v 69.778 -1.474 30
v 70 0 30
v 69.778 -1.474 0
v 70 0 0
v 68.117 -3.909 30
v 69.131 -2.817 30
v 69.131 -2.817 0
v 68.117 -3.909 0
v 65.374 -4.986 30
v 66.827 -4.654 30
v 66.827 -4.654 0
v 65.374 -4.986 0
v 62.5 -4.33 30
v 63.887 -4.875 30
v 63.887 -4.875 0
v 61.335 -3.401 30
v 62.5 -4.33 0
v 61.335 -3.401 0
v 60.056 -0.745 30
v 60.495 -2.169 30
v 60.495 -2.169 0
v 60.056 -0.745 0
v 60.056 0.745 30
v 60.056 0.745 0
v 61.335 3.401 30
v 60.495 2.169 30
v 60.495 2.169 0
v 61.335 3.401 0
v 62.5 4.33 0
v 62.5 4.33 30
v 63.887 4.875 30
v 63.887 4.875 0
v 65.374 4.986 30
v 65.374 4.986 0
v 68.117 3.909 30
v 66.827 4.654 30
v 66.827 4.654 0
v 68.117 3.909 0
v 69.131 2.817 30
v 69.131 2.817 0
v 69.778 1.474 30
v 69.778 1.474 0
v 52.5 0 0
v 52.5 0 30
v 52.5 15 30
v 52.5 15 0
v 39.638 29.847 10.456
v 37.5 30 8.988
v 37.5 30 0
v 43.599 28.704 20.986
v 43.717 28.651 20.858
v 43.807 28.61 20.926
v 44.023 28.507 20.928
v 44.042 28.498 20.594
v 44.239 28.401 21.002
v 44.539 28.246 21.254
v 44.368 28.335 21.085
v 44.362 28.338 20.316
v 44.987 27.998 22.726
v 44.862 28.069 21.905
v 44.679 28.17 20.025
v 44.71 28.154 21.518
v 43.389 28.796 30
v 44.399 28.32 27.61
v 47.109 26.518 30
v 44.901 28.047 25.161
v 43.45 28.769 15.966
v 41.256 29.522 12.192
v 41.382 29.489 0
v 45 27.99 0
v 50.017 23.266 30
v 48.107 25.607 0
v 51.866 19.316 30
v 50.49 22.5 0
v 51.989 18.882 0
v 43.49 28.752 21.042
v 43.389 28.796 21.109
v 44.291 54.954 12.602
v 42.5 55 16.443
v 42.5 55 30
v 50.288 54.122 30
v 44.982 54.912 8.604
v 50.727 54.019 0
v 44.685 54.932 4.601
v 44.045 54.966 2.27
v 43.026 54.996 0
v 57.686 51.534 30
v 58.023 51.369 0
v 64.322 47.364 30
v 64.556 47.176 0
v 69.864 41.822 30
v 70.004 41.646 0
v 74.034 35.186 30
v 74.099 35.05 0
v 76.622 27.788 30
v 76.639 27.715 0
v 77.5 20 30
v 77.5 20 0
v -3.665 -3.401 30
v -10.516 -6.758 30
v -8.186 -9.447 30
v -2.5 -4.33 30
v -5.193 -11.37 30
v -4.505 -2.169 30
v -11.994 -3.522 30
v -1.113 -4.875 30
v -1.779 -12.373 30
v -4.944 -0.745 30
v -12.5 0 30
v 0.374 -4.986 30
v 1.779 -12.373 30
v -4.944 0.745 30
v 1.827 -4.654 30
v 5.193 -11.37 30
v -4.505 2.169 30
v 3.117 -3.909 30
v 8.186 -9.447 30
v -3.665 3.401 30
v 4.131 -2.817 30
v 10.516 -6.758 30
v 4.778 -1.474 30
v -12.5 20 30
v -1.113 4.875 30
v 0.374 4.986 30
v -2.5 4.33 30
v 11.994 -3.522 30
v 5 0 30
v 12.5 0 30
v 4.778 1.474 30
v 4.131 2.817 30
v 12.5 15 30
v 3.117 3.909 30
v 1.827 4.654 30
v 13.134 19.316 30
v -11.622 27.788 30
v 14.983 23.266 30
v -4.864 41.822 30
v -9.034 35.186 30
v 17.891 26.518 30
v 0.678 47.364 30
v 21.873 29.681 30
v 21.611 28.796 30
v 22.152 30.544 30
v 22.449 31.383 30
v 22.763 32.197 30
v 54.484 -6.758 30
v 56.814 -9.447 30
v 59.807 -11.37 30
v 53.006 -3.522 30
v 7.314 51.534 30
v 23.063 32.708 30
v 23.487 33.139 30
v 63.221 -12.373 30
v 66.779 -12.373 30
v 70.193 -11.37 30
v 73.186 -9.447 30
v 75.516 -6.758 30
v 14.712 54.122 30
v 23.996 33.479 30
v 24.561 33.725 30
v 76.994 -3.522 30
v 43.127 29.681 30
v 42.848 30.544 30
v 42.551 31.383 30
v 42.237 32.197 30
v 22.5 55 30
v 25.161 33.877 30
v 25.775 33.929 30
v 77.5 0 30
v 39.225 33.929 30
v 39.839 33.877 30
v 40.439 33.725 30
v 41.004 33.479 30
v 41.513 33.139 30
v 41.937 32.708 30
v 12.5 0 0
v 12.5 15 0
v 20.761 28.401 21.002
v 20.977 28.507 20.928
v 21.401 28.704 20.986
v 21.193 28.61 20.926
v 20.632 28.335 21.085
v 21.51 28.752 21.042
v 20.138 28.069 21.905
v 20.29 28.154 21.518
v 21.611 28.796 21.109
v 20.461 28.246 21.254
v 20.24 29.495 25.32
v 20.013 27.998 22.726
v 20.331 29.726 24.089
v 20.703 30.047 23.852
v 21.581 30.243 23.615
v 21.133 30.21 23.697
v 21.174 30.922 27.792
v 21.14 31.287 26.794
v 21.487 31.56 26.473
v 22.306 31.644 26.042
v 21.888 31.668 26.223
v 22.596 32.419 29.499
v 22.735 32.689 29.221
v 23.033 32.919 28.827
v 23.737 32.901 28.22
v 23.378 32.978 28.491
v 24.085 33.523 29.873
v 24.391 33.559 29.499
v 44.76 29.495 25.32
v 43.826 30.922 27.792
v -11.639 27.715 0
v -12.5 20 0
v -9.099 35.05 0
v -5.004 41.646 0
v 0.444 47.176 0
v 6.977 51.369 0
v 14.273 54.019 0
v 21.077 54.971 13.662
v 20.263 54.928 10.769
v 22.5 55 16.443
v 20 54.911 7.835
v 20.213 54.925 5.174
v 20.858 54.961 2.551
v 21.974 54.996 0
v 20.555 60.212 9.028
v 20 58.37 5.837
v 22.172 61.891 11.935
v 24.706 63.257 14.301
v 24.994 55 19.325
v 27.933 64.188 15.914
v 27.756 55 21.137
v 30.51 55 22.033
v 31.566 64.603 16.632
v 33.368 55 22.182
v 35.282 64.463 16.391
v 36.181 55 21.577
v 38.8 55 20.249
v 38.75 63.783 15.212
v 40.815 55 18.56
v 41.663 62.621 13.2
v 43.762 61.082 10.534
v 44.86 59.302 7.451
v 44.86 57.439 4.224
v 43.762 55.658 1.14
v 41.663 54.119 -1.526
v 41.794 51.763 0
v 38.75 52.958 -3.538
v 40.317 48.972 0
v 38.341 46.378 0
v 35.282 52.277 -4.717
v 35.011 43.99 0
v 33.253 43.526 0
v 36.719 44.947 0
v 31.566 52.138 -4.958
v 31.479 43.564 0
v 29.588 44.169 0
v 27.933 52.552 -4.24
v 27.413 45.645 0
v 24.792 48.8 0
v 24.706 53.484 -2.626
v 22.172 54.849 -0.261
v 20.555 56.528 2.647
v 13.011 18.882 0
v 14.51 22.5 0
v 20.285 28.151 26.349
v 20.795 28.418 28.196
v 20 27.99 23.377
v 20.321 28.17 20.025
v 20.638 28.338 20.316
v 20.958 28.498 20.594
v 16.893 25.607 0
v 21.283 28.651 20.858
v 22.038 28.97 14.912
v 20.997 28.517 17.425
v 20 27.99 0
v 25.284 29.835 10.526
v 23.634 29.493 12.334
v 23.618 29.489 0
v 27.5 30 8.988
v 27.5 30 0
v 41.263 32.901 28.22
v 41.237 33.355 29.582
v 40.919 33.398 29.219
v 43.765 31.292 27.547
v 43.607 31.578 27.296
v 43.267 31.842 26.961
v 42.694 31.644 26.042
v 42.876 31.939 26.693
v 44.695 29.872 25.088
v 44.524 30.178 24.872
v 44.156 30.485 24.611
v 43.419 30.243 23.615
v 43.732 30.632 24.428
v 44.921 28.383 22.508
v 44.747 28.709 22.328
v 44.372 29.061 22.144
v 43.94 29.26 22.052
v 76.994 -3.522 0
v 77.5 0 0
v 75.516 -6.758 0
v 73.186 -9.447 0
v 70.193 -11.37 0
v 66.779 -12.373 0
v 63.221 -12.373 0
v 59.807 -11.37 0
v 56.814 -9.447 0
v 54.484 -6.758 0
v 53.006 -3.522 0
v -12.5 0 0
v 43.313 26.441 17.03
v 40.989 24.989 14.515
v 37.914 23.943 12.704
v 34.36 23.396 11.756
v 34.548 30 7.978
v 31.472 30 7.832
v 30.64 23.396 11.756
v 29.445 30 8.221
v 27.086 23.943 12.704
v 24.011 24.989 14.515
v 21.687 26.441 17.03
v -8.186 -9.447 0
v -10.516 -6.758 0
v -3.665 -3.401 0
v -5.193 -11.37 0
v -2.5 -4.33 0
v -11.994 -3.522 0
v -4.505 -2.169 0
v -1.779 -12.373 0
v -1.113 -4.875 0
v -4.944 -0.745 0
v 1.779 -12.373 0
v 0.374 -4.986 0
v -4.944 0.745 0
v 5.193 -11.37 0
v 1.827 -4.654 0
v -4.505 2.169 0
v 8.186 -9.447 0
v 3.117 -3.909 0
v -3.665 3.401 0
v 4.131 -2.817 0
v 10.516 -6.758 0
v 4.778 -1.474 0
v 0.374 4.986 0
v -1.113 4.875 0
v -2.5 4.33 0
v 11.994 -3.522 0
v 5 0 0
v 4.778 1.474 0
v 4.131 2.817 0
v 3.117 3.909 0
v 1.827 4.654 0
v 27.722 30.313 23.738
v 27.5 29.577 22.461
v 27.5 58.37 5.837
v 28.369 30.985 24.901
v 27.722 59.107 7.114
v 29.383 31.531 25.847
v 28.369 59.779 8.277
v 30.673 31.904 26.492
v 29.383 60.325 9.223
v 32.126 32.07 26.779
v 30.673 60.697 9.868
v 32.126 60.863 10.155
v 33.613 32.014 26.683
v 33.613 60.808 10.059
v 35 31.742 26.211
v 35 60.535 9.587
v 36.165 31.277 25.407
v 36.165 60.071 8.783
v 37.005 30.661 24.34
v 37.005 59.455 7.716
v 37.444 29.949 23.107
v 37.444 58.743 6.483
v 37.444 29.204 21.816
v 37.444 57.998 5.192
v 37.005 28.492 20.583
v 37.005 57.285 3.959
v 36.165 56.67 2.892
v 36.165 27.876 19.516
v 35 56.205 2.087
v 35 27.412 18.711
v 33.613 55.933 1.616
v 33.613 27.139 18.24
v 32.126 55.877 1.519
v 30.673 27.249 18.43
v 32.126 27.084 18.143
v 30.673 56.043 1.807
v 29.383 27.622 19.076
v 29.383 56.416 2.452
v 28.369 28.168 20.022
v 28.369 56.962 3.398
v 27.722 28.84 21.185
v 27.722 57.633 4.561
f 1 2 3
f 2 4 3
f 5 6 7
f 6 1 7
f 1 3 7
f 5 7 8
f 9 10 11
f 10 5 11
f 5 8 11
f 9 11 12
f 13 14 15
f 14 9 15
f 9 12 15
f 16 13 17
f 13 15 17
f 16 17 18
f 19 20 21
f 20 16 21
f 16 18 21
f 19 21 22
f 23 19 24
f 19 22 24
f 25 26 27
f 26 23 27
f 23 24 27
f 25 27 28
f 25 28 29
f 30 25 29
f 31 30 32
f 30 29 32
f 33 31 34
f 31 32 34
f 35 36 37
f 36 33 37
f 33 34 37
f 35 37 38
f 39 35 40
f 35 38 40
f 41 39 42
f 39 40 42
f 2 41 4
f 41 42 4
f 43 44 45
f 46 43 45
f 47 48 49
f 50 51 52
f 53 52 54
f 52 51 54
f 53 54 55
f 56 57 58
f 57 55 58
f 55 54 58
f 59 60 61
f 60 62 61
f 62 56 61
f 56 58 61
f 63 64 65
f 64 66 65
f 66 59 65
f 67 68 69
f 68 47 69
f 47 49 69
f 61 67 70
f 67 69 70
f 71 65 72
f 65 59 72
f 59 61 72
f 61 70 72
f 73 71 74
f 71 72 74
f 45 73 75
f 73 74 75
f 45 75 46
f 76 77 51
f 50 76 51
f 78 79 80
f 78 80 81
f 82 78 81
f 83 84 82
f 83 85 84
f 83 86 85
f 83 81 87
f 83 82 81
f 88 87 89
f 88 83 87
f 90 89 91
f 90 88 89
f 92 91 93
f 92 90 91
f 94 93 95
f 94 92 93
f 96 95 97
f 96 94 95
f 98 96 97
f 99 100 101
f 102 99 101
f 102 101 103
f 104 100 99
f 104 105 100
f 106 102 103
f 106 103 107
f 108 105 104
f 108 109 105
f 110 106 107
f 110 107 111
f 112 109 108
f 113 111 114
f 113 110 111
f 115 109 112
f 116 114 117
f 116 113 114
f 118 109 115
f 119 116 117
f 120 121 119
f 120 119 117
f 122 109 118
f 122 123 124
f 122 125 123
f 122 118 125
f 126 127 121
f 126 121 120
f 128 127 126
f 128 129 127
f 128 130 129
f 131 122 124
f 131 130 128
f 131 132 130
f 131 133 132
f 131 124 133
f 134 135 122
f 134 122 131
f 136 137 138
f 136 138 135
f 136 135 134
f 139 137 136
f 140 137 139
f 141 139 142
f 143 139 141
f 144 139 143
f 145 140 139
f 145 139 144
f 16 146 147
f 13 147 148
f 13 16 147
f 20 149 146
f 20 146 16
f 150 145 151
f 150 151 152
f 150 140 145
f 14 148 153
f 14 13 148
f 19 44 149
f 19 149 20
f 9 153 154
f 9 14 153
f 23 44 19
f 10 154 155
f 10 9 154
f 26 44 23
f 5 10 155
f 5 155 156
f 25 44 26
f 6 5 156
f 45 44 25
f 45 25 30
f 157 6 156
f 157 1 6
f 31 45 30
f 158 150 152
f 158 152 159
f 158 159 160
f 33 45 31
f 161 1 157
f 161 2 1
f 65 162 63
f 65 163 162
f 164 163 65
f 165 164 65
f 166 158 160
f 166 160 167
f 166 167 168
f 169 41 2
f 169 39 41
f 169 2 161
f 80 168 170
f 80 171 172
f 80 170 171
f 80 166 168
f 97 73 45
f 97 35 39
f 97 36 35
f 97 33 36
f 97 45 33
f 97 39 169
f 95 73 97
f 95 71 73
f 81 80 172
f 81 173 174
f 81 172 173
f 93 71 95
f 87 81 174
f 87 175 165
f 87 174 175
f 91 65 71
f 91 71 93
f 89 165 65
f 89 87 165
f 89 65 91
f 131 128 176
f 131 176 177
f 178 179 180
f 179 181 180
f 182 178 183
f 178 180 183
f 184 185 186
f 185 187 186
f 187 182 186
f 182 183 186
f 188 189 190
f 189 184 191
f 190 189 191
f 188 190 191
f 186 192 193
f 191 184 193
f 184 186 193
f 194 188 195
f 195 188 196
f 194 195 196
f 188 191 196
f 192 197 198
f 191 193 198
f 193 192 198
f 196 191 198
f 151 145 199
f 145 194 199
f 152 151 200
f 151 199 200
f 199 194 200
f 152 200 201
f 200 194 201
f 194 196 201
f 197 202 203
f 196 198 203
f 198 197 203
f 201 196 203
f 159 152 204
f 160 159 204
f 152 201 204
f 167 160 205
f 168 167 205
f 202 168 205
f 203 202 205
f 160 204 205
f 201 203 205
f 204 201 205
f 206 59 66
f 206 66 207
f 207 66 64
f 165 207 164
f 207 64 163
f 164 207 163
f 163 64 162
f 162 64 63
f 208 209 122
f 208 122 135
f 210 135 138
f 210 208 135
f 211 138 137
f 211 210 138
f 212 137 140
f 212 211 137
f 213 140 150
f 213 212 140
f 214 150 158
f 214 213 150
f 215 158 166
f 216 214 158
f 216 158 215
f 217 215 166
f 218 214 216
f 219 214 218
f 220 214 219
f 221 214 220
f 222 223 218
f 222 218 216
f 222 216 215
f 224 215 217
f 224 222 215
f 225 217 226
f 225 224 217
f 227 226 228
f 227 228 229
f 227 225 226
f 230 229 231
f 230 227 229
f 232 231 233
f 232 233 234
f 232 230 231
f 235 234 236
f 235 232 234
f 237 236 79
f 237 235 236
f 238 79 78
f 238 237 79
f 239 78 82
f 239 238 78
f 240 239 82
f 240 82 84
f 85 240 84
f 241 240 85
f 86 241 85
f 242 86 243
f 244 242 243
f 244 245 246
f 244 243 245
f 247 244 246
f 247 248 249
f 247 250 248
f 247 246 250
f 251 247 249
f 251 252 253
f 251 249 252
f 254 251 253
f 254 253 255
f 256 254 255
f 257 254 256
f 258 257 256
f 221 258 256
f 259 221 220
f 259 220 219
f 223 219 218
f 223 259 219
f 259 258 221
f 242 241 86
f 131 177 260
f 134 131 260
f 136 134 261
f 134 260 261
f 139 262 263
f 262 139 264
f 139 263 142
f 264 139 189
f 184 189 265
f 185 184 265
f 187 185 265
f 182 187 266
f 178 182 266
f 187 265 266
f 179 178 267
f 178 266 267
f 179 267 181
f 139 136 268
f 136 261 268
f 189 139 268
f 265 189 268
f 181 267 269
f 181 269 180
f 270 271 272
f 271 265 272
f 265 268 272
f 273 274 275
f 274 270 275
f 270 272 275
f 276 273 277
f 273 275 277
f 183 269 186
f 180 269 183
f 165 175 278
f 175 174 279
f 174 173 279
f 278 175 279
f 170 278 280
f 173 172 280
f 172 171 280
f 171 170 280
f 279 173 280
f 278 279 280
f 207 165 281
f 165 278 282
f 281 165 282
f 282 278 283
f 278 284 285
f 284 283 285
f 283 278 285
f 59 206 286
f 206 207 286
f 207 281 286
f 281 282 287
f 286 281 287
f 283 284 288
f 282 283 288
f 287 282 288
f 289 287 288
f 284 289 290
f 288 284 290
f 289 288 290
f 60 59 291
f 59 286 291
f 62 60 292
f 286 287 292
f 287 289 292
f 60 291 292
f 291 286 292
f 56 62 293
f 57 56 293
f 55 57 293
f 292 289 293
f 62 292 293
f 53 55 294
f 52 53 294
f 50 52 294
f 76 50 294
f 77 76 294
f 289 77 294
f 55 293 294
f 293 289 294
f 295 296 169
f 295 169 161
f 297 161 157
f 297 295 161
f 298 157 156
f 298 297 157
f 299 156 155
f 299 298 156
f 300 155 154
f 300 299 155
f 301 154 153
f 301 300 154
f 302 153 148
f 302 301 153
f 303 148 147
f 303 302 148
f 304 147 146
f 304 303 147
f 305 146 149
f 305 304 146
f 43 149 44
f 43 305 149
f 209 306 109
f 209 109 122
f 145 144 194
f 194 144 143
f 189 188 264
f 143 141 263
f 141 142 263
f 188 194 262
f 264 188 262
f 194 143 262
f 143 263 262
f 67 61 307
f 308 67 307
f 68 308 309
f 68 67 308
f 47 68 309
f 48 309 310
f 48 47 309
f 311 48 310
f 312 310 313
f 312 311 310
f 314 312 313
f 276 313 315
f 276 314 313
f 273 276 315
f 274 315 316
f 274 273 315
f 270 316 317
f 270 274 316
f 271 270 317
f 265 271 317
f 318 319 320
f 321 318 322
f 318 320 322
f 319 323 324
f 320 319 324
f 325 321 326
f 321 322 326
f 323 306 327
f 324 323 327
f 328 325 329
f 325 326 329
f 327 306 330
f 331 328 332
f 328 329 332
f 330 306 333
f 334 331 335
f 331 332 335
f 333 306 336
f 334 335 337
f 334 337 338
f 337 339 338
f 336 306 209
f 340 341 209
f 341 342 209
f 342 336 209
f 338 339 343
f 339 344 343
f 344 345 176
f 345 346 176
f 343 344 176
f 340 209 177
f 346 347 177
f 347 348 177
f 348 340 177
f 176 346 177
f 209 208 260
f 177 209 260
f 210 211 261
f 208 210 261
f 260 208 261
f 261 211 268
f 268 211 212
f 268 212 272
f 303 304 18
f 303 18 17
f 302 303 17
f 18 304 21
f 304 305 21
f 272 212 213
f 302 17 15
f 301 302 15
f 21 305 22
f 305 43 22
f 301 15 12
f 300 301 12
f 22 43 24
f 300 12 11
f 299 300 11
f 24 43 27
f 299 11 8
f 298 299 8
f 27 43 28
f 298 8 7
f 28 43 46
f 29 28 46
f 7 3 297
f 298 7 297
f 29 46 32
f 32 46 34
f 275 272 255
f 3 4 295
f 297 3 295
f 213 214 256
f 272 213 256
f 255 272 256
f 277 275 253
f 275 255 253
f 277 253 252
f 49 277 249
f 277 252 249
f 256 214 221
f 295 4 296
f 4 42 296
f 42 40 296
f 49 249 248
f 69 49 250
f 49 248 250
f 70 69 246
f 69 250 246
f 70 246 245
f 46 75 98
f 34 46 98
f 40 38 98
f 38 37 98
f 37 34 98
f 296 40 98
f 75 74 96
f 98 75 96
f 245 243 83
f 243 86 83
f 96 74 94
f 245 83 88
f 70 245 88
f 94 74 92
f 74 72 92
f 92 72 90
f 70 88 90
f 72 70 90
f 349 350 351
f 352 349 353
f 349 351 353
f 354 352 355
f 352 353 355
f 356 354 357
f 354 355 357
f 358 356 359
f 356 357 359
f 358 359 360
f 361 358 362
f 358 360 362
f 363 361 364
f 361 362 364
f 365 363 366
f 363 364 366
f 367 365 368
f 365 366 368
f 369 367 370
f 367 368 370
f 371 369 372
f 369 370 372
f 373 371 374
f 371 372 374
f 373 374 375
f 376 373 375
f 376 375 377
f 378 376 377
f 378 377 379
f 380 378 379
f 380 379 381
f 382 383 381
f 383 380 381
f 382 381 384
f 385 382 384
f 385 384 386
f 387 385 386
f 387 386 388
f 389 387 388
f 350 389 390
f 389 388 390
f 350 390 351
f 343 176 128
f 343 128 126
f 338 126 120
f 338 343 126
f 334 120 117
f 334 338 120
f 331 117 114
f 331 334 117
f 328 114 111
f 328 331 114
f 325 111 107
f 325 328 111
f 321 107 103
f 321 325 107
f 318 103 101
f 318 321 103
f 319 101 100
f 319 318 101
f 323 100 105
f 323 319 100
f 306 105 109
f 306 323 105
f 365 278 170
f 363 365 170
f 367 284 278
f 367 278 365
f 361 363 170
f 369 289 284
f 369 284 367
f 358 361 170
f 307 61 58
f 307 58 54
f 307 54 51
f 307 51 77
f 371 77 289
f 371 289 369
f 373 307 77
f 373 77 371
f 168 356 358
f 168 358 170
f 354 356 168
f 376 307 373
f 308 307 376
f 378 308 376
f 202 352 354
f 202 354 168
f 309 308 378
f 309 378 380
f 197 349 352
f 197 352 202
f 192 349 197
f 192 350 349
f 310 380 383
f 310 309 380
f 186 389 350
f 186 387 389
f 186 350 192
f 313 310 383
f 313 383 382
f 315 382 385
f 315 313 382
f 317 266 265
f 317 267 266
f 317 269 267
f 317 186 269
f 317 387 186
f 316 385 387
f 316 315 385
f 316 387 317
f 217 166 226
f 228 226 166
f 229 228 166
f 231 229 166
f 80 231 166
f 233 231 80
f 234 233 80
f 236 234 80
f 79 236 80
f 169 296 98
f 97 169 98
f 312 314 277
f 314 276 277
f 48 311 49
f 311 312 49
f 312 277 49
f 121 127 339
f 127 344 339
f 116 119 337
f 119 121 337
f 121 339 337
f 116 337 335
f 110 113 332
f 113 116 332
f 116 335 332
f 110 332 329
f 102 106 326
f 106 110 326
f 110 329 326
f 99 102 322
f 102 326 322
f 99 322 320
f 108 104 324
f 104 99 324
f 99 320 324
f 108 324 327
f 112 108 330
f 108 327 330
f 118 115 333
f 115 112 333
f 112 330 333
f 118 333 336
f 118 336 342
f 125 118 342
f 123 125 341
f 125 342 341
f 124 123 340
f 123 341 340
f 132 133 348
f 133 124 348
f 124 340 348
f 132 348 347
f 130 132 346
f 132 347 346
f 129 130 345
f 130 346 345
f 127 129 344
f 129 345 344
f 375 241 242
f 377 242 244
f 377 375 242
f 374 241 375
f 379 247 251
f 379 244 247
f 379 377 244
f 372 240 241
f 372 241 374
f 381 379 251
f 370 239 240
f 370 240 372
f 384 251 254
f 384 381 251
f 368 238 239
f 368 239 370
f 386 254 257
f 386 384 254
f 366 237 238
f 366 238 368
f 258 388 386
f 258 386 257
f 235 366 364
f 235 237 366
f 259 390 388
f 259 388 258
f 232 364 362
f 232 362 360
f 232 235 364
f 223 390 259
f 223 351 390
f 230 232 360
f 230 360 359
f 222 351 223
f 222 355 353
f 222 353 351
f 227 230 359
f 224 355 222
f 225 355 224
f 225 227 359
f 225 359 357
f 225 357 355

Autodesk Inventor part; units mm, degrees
ref_plane "YZ Plane" through (0, 0, 0) normal (1, 0, 0) x (0, 1, 0)
ref_plane "XZ Plane" through (0, 0, 0) normal (0, 1, 0) x (-1, 0, 0)
sketch "Sketch1" plane through (0, 0, 0) normal (0, 0, 1) x (1, 0, 0)
  circle A0 centre (0, 0) radius 5
  circle A1 centre (65, 0) radius 5
  circle A2 centre (0, 0) radius 12.5
  circle A3 centre (65, 0) radius 12.5
  line L0 (22.5, 9.5) -> (42.5, 9.5)
  line L1 (42.5, 9.5) -> (42.5, -10.5)
  line L2 (42.5, -10.5) -> (22.5, -10.5)
  line L3 (22.5, -10.5) -> (22.5, 9.5)
  line L4 (0, 0) -> (65, 0) construction
  line L5 (32.5, 0) -> (32.5, 30) construction
  line L6 (27.5, 30) -> (37.5, 30)
  line L7 (12.5, 0) -> (12.5, 15)
  line L8 (52.5, 0) -> (52.5, 15)
  arc A4 (27.5, 30) -> (12.5, 15) centre (27.5, 15) ccw
  arc A5 (52.5, 15) -> (37.5, 30) centre (37.5, 15) ccw
  line L9 (-12.5, 0) -> (-12.5, 20)
  line L10 (77.5, 0) -> (77.5, 20)
  line L11 (22.5, 55) -> (42.5, 55)
  arc A6 (22.5, 55) -> (-12.5, 20) centre (22.5, 20) ccw
  arc A7 (77.5, 20) -> (42.5, 55) centre (42.5, 20) ccw
  point P0 (22.5, 30)
  point P1 (42.5, 30)
  dimension "d0" = 10
  dimension "d1" = 10
  dimension "d2" = 65
  dimension "d3" = 25
  dimension "d4" = 25
  dimension "d5" = 22.5
  dimension "d6" = 22.5
  dimension "d7" = 9.5
  dimension "d8" = 10.5
  dimension "d11" = 20
  dimension "d12" = 10
  dimension "d13" = 30
  dimension "d14" = 15
  dimension "d15" = 55
  dimension "d16" = 35
extrude "Extrusion1" add sketch "Sketch1" along normal blind 30 contours A2 | A2 L9 A6 L11 A7 L10 A3 L8 A5 L6 A4 L7 | A3
ref_plane "Work Plane1" through (42.5, 55, 0) normal (0, 0.8660254, -0.5) x (-1, 0, 0)
sketch "Sketch2" plane through (42.5, 55, 0) normal (0, 0.8660254, -0.5) x (-1, 0, 0)
  line L0 (0, 0) -> (20, 0) projected
  line L1 (20, 0) -> (20, 25.9808) projected
  line L2 (0, 25.9808) -> (20, 25.9808) projected
  line L3 (0, 0) -> (0, 25.9808) projected
  line L4 (15, -12.5) -> (5, -12.5) projected
  line L5 (5, -12.5) -> (5, 13.4808) projected
  line L6 (15, 13.4808) -> (5, 13.4808) projected
  line L7 (15, -12.5) -> (15, 13.4808) projected
  circle A0 centre (10, 6.7404) radius 5
  circle A1 centre (10, 6.7404) radius 12.5
  point P0 (42.5, -27.5)
  dimension "d20" = 38.4808
  dimension "d21" = 19.2404
  dimension "d22" = 20
  dimension "d23" = 10
  dimension "d24" = 10
  dimension "d25" = 25
extrude "Extrusion6" cut sketch "Sketch2" against normal blind 55.75 contours A0
extrude "Extrusion7" add sketch "Sketch2" against normal blind 39.25 contours L3 A1 L1 L0 L7 L6 L5 | L0 L5 A1 L3 | L5 A0 L7 L0 | L0 L7 A1 L5 | L0 L1 A1 L7 | L5 L6 L7 A0
sketch "Sketch5" plane through (32.5, 24.3787, 25.4623) normal (0, -0.8660254, 0.5) x (-1, 0, 0)
  circle A0 centre (0, 0) radius 5 projected
  circle A1 centre (0, 0) radius 12.5 projected
  point P0 (32.5, 34.2404)
extrude "Extrusion8" cut sketch "Sketch5" against normal blind 6
sketch "Sketch6" plane through (22.5, 55, 30) normal (0, 1, 0) x (1, 0, 0)
  ellipse E0 centre (10, 7.5377) end of major axis (22.5, 7.5377) minor radius 10.8253 (1.0281, 0) -> (18.9719, 0) ccw projected
  line L0 (1.0281, 0) -> (18.9719, 0) projected
  point P0 (-22.5, 30)
extrude "Extrusion9" cut sketch "Sketch6" against normal blind 41
fillet "Fillet3" radius 1.5 2 edges at (20.4586, 31.2539, 25.3665) (44.5414, 31.2539, 25.3665)
equation "\"d12\" = 0.5 * d11"
equation "\"d15\" = d13 + d3"
equation "\"d21\" = 0.5 * d20"
equation "\"d23\" = 0.5 * d22"
properties part number "Mount"
